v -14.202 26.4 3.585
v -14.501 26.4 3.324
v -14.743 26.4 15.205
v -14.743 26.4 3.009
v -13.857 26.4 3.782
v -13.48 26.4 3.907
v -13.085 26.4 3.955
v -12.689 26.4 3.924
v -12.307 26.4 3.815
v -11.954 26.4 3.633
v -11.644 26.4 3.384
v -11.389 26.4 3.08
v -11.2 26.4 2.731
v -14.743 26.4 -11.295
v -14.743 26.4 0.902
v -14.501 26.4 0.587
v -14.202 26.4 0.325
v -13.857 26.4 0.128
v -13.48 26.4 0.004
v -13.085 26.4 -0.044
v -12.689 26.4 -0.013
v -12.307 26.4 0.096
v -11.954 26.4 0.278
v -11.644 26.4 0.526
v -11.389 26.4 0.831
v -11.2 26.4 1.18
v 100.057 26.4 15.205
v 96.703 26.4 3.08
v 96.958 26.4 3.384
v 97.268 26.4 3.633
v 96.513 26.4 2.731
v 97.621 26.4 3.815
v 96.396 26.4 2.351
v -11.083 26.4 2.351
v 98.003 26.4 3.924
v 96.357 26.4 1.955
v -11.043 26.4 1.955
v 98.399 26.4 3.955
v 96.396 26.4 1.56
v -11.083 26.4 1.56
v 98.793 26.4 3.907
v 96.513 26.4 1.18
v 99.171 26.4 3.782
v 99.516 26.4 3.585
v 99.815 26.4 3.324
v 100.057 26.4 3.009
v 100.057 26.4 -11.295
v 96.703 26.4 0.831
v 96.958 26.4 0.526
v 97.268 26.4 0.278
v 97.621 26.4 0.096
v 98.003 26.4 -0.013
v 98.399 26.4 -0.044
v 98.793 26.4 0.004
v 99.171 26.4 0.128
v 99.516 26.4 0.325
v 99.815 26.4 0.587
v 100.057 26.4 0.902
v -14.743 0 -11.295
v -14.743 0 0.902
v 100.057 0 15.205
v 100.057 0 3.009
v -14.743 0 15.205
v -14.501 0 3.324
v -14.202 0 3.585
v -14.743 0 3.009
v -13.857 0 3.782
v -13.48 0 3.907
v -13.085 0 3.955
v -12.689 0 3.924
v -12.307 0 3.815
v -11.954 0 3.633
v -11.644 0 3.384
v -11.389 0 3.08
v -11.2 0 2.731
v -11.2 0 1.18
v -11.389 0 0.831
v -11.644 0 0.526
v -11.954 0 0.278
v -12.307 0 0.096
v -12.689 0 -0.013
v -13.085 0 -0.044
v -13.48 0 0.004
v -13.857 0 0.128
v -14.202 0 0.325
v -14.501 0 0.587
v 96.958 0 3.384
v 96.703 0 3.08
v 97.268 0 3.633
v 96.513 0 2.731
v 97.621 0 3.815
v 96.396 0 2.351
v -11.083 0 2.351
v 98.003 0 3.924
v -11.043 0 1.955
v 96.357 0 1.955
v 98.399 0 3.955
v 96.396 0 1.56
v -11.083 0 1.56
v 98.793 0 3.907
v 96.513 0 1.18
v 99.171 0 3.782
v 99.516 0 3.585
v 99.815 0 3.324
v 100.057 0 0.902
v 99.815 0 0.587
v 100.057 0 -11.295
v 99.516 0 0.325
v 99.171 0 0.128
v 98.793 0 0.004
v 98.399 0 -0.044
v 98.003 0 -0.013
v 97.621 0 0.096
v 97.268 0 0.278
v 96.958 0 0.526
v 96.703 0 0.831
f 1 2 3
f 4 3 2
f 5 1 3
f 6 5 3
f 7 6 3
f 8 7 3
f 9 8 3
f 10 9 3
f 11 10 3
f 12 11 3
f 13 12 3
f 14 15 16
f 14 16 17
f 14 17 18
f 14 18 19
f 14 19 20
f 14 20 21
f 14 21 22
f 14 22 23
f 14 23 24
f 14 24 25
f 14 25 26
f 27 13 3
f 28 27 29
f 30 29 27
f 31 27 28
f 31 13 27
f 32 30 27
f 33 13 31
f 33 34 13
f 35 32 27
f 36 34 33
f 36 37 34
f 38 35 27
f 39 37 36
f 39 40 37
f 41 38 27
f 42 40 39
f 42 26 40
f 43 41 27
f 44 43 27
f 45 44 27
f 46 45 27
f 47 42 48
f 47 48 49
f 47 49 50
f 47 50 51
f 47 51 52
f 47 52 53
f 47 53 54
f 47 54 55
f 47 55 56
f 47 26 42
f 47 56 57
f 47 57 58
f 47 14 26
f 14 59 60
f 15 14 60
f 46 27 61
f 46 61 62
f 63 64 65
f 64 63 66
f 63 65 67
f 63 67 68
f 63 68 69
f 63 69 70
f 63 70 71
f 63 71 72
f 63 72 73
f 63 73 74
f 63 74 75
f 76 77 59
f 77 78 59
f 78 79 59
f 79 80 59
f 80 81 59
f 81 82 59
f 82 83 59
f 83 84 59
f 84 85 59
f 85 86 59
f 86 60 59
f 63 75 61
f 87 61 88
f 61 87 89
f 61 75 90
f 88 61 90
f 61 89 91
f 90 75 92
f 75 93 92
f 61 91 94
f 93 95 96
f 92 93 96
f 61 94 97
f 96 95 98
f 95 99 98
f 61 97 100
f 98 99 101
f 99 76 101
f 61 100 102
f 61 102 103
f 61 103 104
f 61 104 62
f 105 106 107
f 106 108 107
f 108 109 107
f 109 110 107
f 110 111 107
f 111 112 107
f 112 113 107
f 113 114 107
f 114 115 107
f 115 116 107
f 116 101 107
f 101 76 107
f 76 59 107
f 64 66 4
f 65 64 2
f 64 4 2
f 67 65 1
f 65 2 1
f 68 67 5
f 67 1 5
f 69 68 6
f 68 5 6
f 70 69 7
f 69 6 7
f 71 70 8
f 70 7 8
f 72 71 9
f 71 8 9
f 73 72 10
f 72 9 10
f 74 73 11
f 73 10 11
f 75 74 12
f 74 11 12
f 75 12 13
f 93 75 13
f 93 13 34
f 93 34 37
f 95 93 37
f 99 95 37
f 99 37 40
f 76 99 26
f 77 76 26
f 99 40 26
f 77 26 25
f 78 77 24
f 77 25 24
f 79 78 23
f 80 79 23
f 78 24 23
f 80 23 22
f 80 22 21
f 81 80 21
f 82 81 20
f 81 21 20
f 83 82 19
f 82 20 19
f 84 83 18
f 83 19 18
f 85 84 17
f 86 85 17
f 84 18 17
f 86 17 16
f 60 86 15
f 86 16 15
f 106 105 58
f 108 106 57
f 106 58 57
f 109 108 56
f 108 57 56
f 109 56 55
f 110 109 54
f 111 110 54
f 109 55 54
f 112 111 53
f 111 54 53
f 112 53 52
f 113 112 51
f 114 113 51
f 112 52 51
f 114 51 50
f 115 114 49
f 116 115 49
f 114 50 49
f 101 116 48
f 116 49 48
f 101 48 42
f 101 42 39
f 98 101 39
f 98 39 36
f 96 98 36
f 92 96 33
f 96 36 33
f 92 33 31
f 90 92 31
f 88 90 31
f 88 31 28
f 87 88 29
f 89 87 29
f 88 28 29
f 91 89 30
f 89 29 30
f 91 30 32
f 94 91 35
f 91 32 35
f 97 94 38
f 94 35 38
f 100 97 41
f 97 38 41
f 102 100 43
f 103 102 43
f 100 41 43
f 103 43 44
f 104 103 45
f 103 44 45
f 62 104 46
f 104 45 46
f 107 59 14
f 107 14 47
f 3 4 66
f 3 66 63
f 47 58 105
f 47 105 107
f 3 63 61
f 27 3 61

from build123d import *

# Parameters (mm, degrees)
SKETCH_1_W          = 115.8
SKETCH_1_H          = 26.5
EXTRUDE_1_DEPTH     = 26.4
SKETCH_2_R          = 2
CUT_EXTRUDE_5_DEPTH = 106.070564596
SKETCH_3_W          = 26.5
SKETCH_3_H          = 26.4
CUT_EXTRUDE_6_DEPTH = 0.5
SKETCH_4_W          = 26.5
SKETCH_4_H          = 26.4
CUT_EXTRUDE_7_DEPTH = 0.5


with BuildPart() as part:
    # 草图1 → 凸台-拉伸1 (new body)
    with BuildSketch(Plane(origin=(0, 0, 0), x_dir=(1, 0, 0), z_dir=(0, 1, 0))):
        with Locations((42.656744125, -1.955418624)):
            Rectangle(SKETCH_1_W, SKETCH_1_H)
    extrude(amount=EXTRUDE_1_DEPTH)

    # 草图2 → 切除-拉伸5 (cut, through all)
    with BuildSketch(Plane(origin=(0, 26.4, 0), x_dir=(1, 0, 0), z_dir=(0, 1, 0))):
        with Locations(Location((-13.043255875, -1.955418624, 0), (0, 0, 270))):
            Circle(SKETCH_2_R)
        with Locations(Location((98.356744125, -1.955418624, 0), (0, 0, 270))):
            Circle(SKETCH_2_R)
    extrude(amount=-CUT_EXTRUDE_5_DEPTH, mode=Mode.SUBTRACT)

    # 草图3 → 切除-拉伸6 (cut)
    with BuildSketch(Plane(origin=(100.556744125, 0, 0), x_dir=(0, 0, -1), z_dir=(1, 0, 0))):
        with Locations((-1.955418624, 13.2)):
            Rectangle(SKETCH_3_W, SKETCH_3_H)
    extrude(amount=-CUT_EXTRUDE_6_DEPTH, mode=Mode.SUBTRACT)

    # 草图4 → 切除-拉伸7 (cut)
    with BuildSketch(Plane.ZY.offset(15.243255875)):
        with Locations((1.955418624, 13.2)):
            Rectangle(SKETCH_4_W, SKETCH_4_H)
    extrude(amount=-CUT_EXTRUDE_7_DEPTH, mode=Mode.SUBTRACT)


solid = part.part
